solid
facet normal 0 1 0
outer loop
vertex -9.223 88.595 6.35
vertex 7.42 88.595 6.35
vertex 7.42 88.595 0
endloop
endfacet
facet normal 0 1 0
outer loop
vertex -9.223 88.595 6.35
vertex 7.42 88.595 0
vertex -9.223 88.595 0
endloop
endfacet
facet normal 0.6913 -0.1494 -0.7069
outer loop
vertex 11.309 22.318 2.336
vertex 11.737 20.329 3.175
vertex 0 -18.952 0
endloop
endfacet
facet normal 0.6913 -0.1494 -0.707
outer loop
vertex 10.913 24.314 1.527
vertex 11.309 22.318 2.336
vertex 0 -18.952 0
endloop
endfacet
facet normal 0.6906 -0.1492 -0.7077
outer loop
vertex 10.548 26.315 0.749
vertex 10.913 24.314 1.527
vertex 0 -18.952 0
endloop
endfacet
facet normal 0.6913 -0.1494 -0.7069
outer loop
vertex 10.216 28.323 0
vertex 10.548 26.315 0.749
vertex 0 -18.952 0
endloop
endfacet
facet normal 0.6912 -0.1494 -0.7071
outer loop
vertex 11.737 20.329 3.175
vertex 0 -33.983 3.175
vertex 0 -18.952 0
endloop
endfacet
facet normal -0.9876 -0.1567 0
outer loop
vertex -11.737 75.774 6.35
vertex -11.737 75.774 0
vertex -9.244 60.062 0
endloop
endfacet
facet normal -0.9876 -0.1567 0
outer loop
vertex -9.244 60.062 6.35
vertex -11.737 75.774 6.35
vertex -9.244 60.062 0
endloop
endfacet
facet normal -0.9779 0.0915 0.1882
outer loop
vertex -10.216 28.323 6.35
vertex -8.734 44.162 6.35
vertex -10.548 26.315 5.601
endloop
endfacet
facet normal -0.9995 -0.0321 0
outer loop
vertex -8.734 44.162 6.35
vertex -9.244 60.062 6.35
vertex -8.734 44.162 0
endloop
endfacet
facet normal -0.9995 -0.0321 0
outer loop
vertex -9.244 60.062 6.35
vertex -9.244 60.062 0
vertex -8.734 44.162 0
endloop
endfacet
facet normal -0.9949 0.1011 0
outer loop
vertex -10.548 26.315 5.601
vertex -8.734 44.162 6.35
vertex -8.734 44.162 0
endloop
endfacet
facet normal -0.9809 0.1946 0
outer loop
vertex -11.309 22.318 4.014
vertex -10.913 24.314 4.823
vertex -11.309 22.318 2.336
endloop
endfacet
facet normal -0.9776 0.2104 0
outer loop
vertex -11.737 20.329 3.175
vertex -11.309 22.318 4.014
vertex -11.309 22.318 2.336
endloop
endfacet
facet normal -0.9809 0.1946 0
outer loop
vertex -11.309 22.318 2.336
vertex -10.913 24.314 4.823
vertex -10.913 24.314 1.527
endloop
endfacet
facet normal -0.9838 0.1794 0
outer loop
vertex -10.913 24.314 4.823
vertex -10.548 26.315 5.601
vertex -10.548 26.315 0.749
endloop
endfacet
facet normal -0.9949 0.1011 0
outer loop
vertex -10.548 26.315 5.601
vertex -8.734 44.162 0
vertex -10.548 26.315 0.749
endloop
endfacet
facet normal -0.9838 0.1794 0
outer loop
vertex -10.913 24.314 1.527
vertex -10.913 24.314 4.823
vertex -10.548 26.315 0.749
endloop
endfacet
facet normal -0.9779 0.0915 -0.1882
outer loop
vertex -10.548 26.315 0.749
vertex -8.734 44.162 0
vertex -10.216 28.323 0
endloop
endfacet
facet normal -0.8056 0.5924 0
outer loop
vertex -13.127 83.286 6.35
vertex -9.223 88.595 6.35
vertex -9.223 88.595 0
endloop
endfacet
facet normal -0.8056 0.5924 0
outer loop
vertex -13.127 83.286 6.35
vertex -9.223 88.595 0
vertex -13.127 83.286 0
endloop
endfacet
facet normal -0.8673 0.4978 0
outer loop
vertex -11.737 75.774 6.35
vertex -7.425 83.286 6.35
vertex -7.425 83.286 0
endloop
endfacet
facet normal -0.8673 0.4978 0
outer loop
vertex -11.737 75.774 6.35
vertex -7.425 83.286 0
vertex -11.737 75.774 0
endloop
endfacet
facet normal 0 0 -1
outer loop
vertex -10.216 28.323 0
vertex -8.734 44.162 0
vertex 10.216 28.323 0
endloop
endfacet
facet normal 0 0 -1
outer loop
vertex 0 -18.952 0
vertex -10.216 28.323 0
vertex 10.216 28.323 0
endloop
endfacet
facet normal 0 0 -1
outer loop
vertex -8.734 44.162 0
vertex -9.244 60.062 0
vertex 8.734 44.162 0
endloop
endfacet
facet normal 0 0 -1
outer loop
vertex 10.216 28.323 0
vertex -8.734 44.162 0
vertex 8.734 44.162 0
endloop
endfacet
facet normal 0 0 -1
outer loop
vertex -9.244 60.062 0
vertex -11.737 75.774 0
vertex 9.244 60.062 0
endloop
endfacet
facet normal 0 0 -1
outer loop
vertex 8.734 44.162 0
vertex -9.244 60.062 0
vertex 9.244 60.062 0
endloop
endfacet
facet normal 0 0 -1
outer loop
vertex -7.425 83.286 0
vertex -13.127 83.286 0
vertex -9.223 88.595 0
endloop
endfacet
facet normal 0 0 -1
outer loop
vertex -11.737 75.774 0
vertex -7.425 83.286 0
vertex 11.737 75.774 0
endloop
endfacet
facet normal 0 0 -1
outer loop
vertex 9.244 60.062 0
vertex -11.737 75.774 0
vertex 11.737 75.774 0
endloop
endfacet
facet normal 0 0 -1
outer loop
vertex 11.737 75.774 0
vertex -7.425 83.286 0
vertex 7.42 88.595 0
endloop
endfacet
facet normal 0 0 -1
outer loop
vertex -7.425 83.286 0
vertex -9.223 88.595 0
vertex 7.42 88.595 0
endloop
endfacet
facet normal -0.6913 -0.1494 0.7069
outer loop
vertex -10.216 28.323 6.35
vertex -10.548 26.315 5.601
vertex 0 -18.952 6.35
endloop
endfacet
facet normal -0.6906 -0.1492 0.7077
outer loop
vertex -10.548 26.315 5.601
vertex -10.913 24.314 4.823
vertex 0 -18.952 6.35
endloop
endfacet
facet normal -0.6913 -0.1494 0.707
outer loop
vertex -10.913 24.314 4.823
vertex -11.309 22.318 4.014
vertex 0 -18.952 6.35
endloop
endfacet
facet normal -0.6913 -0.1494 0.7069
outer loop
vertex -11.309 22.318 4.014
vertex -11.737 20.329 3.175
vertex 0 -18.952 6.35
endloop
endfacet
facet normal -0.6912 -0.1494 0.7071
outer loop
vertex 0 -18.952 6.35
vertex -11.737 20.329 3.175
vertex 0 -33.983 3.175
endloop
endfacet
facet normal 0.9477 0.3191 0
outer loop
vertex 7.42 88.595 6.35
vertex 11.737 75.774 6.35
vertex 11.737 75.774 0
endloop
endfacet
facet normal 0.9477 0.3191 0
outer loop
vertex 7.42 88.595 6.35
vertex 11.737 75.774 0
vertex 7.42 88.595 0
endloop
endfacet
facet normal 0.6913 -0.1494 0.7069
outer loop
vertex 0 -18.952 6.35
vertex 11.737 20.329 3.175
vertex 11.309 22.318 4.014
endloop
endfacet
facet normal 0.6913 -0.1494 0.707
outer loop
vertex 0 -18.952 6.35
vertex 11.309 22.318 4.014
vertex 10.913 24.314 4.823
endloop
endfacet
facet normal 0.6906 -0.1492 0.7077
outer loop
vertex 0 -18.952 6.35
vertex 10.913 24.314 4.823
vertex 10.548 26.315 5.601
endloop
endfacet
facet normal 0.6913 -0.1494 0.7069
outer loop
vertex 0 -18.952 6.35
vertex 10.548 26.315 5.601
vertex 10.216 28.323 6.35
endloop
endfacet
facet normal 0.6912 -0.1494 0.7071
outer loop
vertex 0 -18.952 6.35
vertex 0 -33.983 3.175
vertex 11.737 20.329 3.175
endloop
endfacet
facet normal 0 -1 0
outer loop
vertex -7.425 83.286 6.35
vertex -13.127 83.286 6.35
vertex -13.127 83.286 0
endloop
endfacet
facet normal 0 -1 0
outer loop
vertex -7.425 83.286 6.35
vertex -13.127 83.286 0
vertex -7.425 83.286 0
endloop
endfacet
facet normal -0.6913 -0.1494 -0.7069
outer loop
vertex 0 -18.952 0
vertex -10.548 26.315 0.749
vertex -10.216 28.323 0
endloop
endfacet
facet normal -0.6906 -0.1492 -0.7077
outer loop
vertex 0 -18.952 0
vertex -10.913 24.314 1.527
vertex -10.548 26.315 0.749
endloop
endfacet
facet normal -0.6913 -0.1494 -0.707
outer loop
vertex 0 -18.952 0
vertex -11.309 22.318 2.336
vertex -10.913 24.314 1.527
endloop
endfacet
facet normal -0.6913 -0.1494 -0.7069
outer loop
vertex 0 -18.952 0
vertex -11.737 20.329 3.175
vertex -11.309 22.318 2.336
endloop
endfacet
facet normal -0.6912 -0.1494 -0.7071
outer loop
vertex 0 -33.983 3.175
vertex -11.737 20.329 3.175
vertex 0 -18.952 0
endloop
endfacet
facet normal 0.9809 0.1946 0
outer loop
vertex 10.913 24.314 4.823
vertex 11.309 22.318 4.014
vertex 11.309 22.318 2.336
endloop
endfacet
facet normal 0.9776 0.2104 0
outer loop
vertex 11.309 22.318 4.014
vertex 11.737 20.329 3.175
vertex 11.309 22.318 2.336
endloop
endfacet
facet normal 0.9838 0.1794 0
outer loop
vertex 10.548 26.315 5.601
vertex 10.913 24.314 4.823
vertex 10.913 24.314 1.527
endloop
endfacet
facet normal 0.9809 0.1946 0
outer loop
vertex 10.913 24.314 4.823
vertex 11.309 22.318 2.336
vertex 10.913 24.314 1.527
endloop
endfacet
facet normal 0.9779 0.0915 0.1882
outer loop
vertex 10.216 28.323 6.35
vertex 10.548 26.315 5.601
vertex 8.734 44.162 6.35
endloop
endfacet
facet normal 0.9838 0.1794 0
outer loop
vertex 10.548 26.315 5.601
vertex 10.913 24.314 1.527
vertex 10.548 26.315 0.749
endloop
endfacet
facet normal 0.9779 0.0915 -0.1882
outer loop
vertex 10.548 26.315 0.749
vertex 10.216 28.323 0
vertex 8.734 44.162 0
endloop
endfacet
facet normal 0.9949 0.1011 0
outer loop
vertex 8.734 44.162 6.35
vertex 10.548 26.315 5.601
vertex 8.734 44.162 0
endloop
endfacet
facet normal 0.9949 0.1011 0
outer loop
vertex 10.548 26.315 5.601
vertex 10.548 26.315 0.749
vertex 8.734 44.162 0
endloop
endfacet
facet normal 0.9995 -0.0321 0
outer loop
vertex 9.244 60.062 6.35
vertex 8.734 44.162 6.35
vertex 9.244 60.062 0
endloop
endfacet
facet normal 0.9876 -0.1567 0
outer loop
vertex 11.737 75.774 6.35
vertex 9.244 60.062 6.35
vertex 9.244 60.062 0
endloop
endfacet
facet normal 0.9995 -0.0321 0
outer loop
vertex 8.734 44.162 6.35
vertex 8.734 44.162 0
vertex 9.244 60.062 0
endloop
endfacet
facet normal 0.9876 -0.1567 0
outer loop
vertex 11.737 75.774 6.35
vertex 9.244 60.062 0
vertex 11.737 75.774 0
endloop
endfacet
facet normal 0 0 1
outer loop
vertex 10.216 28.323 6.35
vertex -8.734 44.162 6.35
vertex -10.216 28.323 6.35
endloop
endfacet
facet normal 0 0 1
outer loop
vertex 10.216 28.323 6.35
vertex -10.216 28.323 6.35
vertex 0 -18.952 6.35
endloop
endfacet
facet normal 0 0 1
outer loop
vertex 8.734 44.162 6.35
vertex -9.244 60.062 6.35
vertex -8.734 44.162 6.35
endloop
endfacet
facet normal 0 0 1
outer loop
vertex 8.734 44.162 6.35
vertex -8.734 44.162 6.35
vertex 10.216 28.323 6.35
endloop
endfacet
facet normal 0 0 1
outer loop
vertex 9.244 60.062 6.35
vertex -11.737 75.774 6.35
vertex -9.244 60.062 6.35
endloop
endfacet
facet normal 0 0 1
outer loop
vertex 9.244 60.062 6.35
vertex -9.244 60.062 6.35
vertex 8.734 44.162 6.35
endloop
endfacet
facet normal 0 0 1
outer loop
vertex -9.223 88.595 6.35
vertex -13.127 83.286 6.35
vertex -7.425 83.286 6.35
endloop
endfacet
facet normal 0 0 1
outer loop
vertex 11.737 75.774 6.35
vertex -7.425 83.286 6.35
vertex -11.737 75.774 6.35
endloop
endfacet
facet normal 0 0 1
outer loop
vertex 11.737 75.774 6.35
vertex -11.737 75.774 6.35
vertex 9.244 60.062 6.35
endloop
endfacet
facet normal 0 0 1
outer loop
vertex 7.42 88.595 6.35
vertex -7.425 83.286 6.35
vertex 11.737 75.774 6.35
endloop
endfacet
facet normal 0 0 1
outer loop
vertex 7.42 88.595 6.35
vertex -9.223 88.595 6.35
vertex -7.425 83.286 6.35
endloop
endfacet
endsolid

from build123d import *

# Parameters (mm, degrees)
F1_DEPTH = 6.35
F3_DEPTH = 25.4
F5_DEPTH = 6.35
F6_SIZE  = 3.17499


# Not quite as in the source:
# - a fillet or chamfer is up to 0.001 mm smaller than in the source, because OpenCascade refuses the exact size


with BuildPart() as f1:
    # F0 (on Top) → F1 (new body)
    with BuildSketch(Plane.XY):
        Polygon((-21.1028610796, 36.5512275749), (-11.7370359251, 20.3291425525), (0, 29.516665265), (11.7370359251, 20.3291425525), (33.4666037048, 57.9658579735), (26.5181194991, 63.6764243245), (35.1014384706, 60.7974748498), (47.9729409095, 83.0915710438), (43.2239025831, 86.8056491017), (49.1863254635, 85.1932147405), (60.325, 104.4859649666), (44.45, 109.9852262806), (0, 63.5), (-44.45, 109.9852262806), (-60.325, 104.4859649666), (-49.1863254635, 85.1932147405), (-43.2239025831, 86.8056491017), (-47.9729409095, 83.0915710438), (-35.1014384706, 60.7974748498), (-26.5181194991, 63.6764243245), (-33.4666037048, 57.9658579735), align=None)
    extrude(amount=F1_DEPTH)

    # F2 (on face) → F3 (cut)
    with BuildSketch(Plane(origin=(0, 0, 0), x_dir=(1, 0, 0), z_dir=(0, 0, -1))):
        with BuildLine():
            ThreePointArc((-11.7370359251, -75.7744380392), (-8.6743378245, -48.0517902958), (-11.7370359251, -20.3291425525))
            Line((-11.7370359251, -20.3291425525), (-33.4666037048, -57.9658579735))
            Line((-33.4666037048, -57.9658579735), (-26.5181194991, -63.6764243245))
            Line((-26.5181194991, -63.6764243245), (-35.1014384706, -60.7974748498))
            Line((-35.1014384706, -60.7974748498), (-47.9729409095, -83.0915710438))
            Line((-47.9729409095, -83.0915710438), (-43.2239025831, -86.8056491017))
            Line((-43.2239025831, -86.8056491017), (-49.1863254635, -85.1932147405))
            Line((-49.1863254635, -85.1932147405), (-60.325, -104.4859649666))
            Line((-60.325, -104.4859649666), (-44.45, -109.9852262806))
            Line((-44.45, -109.9852262806), (-11.7370359251, -75.7744380392))
        make_face()
        with BuildLine():
            Line((33.4666037048, -57.9658579735), (11.7370359251, -20.3291425525))
            ThreePointArc((11.7370359251, -20.3291425525), (8.6743378245, -48.0517902958), (11.7370359251, -75.7744380392))
            Line((11.7370359251, -75.7744380392), (44.45, -109.9852262806))
            Line((44.45, -109.9852262806), (60.325, -104.4859649666))
            Line((60.325, -104.4859649666), (49.1863254635, -85.1932147405))
            Line((49.1863254635, -85.1932147405), (43.2239025831, -86.8056491017))
            Line((43.2239025831, -86.8056491017), (47.9729409095, -83.0915710438))
            Line((47.9729409095, -83.0915710438), (35.1014384706, -60.7974748498))
            Line((35.1014384706, -60.7974748498), (26.5181194991, -63.6764243245))
            Line((26.5181194991, -63.6764243245), (33.4666037048, -57.9658579735))
        make_face()
    extrude(amount=-F3_DEPTH, mode=Mode.SUBTRACT)

    # F4 (on face) → F5 (join)
    with BuildSketch(Plane.XY.offset(6.35)):
        Polygon((-7.4254795909, 83.2857191563), (-11.7370359251, 75.7744380392), (0, 63.5), (11.7370359251, 75.7744380392), (7.4199811484, 88.5948985815), (-9.2232923578, 88.5948985815), (-13.126935586, 83.2857191563), align=None)
        Polygon((0, 29.516665265), (-11.7370359251, 20.3291425525), (0, -33.983334735), (11.7370359251, 20.3291425525), align=None)
    extrude(amount=-F5_DEPTH)

    # F6 (size 3.175 in the source; OpenCascade refuses exactly that, so slightly less here)
    f6_edges = [f1.edges().sort_by_distance(p)[0] for p in [
        (5.868518, -6.827096, 6.35),
        (-5.868518, -6.827096, 6.35),
        (5.868518, -6.827096, 0),
        (-5.868518, -6.827096, 0),
    ]]
    chamfer(f6_edges, length=F6_SIZE)


solid = f1.part
